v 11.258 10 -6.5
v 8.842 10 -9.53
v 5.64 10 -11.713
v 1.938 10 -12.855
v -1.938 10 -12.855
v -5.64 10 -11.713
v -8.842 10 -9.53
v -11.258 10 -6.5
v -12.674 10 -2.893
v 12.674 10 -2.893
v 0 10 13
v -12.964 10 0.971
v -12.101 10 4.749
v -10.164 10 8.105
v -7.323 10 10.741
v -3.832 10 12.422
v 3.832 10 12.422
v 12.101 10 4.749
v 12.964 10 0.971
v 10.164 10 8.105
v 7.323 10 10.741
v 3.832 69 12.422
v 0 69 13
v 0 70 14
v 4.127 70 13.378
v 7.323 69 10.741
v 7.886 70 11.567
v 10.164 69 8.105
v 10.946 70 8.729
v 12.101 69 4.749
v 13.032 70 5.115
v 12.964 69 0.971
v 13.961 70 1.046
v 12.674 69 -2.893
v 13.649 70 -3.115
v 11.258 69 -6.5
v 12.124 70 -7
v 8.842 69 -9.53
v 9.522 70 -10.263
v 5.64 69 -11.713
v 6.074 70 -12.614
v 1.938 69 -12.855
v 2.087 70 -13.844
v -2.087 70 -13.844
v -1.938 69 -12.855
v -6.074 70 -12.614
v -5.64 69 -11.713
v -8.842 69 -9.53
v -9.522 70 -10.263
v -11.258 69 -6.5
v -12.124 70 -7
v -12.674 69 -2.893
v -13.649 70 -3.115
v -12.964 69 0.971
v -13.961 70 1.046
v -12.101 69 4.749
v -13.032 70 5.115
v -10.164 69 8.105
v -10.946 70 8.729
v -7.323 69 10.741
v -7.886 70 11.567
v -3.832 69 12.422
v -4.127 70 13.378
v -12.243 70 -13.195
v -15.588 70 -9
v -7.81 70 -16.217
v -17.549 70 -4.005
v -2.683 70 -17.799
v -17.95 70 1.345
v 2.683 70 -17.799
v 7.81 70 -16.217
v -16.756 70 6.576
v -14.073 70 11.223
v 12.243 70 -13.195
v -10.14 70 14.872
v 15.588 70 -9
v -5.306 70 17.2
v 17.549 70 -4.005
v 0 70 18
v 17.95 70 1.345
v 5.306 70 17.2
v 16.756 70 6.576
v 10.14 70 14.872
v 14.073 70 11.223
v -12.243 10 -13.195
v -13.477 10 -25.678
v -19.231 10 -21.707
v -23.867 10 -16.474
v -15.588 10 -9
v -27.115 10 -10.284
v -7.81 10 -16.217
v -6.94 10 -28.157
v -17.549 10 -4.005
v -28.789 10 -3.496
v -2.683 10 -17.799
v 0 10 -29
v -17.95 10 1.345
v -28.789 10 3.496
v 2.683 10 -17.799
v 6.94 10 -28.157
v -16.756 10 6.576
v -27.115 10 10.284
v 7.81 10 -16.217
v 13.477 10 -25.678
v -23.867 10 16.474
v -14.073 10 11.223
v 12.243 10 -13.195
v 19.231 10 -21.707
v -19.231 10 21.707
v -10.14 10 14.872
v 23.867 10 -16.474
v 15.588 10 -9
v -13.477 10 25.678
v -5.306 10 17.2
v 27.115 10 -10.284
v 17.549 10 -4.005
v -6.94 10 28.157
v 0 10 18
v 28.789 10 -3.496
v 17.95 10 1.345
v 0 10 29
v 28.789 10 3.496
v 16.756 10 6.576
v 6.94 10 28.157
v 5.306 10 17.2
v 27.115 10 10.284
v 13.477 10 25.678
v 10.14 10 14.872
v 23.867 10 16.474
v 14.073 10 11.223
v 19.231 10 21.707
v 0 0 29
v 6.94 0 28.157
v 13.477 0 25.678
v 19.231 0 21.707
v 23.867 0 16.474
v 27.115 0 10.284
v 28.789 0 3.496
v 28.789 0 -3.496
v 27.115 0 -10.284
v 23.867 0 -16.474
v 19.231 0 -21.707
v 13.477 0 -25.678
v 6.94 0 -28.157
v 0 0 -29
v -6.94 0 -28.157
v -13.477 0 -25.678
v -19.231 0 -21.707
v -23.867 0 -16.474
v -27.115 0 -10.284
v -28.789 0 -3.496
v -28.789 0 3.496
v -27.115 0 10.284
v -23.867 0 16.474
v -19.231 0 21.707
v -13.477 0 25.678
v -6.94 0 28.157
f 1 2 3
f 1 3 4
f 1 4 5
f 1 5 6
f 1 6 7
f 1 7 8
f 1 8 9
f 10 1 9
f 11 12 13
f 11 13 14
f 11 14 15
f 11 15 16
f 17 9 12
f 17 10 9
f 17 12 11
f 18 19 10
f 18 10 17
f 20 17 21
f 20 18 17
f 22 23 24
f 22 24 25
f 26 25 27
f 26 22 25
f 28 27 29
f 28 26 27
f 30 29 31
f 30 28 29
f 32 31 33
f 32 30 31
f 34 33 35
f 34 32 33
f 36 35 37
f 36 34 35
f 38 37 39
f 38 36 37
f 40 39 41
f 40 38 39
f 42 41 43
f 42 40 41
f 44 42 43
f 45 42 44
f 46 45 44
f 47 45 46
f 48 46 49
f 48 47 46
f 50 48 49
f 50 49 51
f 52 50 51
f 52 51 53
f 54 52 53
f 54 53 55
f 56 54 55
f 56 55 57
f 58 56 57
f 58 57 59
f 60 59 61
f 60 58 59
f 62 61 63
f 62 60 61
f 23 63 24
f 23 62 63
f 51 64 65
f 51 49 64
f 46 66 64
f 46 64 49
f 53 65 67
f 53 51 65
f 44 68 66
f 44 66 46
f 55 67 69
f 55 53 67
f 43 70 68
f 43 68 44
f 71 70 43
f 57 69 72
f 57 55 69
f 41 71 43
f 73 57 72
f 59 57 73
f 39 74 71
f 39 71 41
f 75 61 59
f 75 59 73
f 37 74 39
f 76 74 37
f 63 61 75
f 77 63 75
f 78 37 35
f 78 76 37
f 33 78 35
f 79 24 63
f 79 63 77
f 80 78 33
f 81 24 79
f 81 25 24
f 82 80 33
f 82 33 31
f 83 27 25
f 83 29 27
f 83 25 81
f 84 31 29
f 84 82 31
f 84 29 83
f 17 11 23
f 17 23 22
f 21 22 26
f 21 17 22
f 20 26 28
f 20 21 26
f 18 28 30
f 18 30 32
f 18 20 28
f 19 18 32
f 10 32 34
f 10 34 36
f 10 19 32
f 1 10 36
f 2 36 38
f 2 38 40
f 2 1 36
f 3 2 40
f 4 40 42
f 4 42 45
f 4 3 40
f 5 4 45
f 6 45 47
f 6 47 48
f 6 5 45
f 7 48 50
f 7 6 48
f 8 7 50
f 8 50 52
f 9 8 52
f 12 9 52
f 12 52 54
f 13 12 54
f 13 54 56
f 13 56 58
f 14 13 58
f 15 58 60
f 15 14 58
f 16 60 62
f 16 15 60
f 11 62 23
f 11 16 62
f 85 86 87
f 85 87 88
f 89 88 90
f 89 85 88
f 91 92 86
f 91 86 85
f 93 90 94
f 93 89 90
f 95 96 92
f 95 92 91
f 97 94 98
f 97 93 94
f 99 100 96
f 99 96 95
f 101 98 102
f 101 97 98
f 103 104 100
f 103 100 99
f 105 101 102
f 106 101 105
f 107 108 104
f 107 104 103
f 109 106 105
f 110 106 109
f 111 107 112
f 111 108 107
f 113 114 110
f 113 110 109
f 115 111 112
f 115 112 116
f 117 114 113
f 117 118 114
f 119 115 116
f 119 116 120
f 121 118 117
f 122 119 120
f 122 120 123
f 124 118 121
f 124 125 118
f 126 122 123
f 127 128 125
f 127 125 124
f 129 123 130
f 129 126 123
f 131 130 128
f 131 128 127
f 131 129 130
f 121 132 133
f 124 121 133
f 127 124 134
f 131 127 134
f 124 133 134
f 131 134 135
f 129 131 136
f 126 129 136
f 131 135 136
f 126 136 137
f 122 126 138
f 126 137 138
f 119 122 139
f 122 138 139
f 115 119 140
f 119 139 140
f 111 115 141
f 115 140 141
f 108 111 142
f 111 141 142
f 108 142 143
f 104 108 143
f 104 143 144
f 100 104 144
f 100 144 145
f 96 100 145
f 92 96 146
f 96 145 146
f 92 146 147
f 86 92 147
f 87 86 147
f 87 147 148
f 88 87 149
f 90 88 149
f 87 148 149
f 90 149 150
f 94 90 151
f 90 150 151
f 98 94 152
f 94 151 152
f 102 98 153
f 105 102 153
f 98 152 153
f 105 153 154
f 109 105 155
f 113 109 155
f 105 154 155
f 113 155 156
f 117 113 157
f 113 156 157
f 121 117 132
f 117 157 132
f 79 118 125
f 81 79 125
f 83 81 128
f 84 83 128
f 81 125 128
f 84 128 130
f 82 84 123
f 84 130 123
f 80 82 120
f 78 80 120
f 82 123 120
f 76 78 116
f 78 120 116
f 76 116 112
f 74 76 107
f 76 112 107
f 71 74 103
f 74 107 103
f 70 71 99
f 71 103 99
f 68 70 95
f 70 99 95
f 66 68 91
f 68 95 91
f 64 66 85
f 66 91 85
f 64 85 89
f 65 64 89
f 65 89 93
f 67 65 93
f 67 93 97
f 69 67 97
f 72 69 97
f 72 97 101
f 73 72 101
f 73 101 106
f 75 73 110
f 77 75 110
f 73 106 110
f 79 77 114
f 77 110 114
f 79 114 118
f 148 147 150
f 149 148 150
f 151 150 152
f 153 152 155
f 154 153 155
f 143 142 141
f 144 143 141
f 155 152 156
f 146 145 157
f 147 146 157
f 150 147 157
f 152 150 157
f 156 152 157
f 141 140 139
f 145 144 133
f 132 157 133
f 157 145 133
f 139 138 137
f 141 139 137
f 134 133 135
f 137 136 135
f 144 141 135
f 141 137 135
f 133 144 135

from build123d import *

# Parameters (mm, degrees)
SKETCH_1_R      = 29
EXTRUDE_1_DEPTH = 10
SKETCH_2_R      = 18
SKETCH_2_R_2    = 13
EXTRUDE_2_DEPTH = 60
CHAMFER_1_SIZE  = 1


with BuildPart() as part:
    # 草图1 → 凸台-拉伸1 (new body)
    with BuildSketch(Plane(origin=(0, 0, 0), x_dir=(1, 0, 0), z_dir=(0, 1, 0))):
        with Locations(Location((0, 0, 0), (0, 0, 270))):
            Circle(SKETCH_1_R)
    extrude(amount=EXTRUDE_1_DEPTH)

    # 草图2 → 凸台-拉伸2 (add)
    with BuildSketch(Plane(origin=(0, 10, 0), x_dir=(1, 0, 0), z_dir=(0, 1, 0))):
        with Locations(Location((0, 0, 0), (0, 0, 270))):
            Circle(SKETCH_2_R)
        with Locations(Location((0, 0, 0), (0, 0, 270))):
            Circle(SKETCH_2_R_2, mode=Mode.SUBTRACT)
    extrude(amount=EXTRUDE_2_DEPTH)

    # 倒角1
    chamfer_1_edges = [part.edges().sort_by_distance(p)[0] for p in [
        (0, 70, -13),
    ]]
    chamfer(chamfer_1_edges, length=CHAMFER_1_SIZE)


solid = part.part
